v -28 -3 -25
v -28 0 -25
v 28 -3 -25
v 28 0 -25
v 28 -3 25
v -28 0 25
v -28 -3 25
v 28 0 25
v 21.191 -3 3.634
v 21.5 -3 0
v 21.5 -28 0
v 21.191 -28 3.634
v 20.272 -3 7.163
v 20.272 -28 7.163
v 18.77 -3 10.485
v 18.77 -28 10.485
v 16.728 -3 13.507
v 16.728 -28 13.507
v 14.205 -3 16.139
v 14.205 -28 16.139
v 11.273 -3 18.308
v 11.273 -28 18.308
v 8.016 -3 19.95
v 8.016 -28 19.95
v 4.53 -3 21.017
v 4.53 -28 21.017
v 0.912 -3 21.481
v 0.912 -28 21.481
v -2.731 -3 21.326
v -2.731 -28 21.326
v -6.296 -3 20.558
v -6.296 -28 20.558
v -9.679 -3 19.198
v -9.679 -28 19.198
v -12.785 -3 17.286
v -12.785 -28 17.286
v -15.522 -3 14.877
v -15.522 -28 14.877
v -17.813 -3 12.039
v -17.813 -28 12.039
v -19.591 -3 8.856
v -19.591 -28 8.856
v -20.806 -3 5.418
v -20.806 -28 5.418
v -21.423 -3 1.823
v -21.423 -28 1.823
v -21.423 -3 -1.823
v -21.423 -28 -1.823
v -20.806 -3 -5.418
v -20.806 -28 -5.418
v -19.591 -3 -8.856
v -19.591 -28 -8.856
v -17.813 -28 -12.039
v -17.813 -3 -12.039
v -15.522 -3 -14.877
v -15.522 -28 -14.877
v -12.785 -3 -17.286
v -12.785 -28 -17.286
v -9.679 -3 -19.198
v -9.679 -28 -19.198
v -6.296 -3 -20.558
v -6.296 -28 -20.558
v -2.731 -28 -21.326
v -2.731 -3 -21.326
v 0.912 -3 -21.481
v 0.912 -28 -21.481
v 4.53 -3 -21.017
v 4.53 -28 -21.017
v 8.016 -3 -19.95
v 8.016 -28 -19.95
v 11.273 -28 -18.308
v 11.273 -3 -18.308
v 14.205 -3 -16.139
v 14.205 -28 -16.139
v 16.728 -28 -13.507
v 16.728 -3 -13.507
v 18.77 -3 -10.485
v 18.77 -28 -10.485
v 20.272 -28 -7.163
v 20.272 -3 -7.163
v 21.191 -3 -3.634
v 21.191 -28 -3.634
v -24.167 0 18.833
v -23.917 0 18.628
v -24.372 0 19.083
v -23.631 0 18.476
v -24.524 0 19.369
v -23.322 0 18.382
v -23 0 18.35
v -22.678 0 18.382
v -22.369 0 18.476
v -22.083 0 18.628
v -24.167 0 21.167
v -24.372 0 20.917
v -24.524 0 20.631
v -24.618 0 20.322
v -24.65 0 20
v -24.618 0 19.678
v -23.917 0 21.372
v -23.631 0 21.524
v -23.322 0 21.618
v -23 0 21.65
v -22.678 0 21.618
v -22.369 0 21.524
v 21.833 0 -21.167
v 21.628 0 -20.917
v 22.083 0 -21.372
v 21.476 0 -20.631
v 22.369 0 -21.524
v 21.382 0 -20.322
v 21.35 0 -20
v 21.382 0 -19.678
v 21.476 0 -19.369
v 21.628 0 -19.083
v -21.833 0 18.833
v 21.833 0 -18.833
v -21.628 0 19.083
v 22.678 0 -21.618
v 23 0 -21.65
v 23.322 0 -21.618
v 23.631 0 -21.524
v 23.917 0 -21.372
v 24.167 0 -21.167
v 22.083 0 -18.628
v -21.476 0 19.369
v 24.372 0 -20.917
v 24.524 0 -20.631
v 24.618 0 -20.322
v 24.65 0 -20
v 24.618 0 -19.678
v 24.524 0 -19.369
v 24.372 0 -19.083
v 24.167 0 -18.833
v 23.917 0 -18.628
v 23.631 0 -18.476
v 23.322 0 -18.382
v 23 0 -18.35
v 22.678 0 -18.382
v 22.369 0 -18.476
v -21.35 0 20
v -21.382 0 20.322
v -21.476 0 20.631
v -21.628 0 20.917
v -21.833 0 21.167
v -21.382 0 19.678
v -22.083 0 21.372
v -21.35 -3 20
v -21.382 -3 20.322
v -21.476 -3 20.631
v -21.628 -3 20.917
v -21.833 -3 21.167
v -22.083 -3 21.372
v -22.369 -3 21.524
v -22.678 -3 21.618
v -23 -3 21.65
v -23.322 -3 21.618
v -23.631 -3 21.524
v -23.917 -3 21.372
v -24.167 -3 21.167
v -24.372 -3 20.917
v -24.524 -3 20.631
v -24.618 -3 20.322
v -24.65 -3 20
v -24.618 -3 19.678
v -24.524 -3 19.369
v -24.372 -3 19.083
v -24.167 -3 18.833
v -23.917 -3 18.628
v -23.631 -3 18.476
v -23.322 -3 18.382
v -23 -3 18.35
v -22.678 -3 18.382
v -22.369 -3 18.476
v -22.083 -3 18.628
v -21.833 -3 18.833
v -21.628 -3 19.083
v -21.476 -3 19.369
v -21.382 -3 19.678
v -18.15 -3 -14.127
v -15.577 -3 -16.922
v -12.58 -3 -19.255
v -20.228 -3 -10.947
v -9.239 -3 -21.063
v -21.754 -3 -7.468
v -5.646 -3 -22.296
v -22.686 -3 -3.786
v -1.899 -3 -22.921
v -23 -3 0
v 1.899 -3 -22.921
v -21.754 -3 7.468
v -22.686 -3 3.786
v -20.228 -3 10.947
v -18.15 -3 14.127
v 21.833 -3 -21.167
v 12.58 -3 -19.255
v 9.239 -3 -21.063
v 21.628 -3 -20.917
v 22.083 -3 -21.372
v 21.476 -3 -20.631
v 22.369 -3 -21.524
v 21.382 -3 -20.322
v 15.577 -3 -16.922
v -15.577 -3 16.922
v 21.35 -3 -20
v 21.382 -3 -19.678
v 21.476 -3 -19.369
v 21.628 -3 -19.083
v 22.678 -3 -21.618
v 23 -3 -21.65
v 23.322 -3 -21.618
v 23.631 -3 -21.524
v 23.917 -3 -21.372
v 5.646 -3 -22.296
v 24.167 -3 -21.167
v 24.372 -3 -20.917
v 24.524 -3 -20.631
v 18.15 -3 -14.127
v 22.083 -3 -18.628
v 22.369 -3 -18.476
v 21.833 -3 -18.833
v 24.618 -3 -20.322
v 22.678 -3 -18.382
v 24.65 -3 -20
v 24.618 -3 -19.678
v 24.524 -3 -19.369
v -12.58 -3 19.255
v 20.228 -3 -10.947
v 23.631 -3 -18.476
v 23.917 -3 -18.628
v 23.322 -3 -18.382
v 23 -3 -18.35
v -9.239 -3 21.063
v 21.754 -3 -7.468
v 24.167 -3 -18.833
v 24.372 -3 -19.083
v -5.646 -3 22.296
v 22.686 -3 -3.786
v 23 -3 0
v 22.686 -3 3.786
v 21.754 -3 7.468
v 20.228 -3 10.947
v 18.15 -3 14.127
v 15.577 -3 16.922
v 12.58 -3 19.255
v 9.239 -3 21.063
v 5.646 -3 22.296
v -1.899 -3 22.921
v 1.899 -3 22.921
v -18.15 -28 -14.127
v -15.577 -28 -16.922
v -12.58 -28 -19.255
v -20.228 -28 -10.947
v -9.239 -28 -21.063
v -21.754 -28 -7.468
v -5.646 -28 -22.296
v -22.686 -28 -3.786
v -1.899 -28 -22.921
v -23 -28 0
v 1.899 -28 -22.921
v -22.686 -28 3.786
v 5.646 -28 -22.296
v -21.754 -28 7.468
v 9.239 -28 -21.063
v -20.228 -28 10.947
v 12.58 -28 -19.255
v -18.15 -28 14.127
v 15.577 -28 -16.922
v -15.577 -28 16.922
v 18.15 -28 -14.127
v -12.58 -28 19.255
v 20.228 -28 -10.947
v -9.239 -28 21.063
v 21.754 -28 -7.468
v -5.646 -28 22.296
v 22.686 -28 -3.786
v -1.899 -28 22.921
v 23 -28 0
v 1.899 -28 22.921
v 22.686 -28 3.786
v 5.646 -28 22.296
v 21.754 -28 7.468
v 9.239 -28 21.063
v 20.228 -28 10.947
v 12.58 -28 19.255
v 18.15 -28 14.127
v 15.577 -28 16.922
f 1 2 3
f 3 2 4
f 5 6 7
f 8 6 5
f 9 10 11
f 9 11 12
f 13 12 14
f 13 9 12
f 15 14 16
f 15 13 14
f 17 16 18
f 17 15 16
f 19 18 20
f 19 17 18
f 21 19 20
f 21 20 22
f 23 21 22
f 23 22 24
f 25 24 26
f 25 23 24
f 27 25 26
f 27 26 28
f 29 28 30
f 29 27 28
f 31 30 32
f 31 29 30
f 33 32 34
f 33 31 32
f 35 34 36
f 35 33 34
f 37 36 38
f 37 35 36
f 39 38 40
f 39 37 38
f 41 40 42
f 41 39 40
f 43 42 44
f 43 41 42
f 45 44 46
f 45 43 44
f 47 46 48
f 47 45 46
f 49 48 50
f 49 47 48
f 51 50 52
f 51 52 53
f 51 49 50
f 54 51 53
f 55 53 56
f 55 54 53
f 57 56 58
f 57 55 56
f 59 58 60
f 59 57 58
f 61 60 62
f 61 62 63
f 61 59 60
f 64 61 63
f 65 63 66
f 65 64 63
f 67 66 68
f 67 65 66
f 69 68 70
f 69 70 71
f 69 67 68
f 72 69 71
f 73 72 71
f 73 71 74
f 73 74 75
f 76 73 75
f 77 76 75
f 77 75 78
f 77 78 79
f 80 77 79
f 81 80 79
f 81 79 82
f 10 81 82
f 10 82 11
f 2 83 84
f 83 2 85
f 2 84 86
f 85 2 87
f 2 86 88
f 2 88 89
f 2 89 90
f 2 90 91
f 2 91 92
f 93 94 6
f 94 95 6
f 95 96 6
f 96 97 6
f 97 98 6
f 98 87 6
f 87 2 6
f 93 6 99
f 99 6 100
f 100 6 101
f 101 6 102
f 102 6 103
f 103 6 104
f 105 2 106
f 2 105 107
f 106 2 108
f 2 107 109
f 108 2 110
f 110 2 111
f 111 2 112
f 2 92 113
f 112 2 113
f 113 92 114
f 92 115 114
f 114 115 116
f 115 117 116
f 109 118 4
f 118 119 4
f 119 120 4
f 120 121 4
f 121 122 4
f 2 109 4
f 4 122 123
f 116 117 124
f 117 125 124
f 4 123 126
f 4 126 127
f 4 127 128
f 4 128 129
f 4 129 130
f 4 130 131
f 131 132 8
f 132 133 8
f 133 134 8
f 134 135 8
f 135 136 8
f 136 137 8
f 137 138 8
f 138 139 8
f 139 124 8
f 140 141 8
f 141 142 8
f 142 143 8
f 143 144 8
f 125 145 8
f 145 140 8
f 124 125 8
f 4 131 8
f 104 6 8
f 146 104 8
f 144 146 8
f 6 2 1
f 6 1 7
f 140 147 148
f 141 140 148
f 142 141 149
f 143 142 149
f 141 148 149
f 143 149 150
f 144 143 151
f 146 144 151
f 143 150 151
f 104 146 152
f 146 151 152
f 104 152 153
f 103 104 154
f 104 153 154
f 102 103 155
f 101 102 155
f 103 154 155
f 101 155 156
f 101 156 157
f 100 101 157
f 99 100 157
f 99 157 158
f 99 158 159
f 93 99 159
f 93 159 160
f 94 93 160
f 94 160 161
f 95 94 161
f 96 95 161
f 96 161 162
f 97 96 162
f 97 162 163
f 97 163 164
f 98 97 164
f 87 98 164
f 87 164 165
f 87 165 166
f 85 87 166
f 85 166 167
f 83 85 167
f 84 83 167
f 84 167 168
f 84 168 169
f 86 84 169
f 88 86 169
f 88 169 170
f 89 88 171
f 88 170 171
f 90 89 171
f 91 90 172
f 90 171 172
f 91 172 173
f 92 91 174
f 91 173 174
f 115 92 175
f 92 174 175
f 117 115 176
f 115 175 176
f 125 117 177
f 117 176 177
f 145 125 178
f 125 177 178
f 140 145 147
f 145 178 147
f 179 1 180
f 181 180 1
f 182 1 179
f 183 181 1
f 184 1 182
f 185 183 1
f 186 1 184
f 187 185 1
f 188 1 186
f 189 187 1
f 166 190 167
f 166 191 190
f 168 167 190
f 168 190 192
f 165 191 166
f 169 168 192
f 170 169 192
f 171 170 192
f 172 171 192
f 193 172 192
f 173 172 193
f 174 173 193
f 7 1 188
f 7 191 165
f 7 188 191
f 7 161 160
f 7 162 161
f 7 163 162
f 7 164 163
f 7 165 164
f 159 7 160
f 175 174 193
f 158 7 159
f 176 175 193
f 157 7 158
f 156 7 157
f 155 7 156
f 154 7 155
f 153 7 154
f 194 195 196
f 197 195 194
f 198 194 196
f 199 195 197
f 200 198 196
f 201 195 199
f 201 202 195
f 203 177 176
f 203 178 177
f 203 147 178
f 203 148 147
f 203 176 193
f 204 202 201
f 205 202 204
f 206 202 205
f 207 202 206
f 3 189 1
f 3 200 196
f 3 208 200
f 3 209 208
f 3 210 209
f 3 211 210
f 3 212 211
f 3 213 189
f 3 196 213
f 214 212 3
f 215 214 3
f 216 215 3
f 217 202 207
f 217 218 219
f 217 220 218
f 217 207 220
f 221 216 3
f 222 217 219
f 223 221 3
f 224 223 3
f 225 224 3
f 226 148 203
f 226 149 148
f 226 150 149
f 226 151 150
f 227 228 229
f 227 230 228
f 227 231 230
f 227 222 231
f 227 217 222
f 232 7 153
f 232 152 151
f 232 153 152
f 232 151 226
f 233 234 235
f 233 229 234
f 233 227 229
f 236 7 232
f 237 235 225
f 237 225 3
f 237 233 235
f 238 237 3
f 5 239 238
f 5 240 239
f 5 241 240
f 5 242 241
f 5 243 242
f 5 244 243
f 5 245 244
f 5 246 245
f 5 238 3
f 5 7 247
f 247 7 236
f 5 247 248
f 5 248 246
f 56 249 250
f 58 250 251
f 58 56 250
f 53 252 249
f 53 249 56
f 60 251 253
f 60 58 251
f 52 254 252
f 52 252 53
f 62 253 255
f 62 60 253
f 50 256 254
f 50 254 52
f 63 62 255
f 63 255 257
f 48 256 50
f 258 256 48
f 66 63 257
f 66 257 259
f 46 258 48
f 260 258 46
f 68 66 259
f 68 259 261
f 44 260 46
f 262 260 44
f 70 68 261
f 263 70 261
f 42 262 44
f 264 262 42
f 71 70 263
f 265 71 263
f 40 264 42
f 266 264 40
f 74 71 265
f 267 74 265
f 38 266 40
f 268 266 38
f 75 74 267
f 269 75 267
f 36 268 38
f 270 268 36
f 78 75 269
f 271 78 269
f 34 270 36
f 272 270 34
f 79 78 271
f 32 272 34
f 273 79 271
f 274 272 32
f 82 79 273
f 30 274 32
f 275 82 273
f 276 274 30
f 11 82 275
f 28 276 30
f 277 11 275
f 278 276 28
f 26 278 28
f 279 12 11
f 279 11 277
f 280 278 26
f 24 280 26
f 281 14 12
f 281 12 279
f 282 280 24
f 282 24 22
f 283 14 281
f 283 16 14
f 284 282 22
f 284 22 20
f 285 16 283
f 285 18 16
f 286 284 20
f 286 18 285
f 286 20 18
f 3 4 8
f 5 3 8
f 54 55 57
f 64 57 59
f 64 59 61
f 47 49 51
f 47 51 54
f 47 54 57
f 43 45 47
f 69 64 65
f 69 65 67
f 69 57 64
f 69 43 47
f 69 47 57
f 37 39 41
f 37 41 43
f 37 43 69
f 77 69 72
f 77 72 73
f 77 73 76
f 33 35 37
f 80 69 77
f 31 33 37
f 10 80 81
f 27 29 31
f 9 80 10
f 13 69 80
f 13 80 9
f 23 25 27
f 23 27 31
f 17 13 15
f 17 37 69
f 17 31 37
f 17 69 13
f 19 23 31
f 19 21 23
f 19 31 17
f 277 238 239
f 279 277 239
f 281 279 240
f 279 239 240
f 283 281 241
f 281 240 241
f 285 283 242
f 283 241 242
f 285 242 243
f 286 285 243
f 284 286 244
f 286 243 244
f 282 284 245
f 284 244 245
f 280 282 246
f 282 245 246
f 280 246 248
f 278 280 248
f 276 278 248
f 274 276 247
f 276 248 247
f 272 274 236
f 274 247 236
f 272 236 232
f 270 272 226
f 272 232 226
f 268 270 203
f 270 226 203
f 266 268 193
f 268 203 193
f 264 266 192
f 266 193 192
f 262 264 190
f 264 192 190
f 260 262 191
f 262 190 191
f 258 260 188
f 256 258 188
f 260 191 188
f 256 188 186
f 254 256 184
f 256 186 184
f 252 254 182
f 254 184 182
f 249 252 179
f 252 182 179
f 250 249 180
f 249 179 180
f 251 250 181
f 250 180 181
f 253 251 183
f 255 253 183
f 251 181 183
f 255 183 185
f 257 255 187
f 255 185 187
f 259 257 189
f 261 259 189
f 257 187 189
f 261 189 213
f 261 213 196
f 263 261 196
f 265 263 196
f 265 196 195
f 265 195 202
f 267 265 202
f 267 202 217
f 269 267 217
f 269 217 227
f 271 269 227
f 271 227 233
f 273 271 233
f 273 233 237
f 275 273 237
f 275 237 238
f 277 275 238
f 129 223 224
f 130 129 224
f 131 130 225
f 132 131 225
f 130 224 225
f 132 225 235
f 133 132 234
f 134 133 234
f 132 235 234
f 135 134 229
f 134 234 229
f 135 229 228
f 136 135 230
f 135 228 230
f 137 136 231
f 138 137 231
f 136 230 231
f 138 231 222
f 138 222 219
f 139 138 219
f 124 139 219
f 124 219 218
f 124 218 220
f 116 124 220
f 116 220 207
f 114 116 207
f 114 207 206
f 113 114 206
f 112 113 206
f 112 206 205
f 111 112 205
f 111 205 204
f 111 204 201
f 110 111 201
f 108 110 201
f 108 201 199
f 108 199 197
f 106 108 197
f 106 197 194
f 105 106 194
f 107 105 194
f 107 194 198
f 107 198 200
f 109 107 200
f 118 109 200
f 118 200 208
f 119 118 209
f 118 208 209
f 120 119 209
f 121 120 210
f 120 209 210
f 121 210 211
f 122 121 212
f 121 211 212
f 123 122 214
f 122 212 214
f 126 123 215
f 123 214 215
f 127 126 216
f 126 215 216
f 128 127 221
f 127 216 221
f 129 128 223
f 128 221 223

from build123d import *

# Parameters (mm, degrees)
F0_W     = 56
F0_H     = 50
F0_R     = 1.65
F0_R_2   = 23
F0_R_3   = 21.5
F1_DEPTH = 28
F2_R     = 21.5
F3_DEPTH = 25
F4_R     = 1.65
F5_DEPTH = 28.001
F7_DEPTH = 25
F6_R     = 23
F6_R_2   = 21.5
F8_DEPTH = 25


with BuildPart() as f1:
    # F0 (on Front) → F1 (new body)
    with BuildSketch(Plane.XZ):
        Rectangle(F0_W, F0_H)
        with Locations((23, -20)):
            Circle(F0_R, mode=Mode.SUBTRACT)
        with Locations((-23, 20)):
            Circle(F0_R, mode=Mode.SUBTRACT)
        Circle(F0_R_2, mode=Mode.SUBTRACT)
        Circle(F0_R_2)
        Circle(F0_R_3, mode=Mode.SUBTRACT)
        Circle(F0_R_3)
        with Locations((23, -20)):
            Circle(F0_R)
        with Locations((-23, 20)):
            Circle(F0_R)
    extrude(amount=F1_DEPTH)

    # F2 (on face) → F3 (cut)
    with BuildSketch(Plane.XZ.offset(28)):
        Circle(F2_R)
    extrude(amount=-F3_DEPTH, mode=Mode.SUBTRACT)

    # F4 (on face) → F5 (cut, through all)
    with BuildSketch(Plane.XZ.offset(28)):
        with Locations((-23, 20)):
            Circle(F4_R)
        with Locations((23, -20)):
            Circle(F4_R)
    extrude(amount=-F5_DEPTH, mode=Mode.SUBTRACT)

    # F7 (cut): a face of the model
    f7_faces = [f1.faces().sort_by_distance(p)[0] for p in [
        (0, -28, -24.2492670248),
    ]]
    extrude(f7_faces, amount=-F7_DEPTH, mode=Mode.SUBTRACT)

    # F6 (on face) → F8 (join)
    with BuildSketch(Plane.XZ.offset(3)):
        Circle(F6_R)
        Circle(F6_R_2, mode=Mode.SUBTRACT)
    extrude(amount=F8_DEPTH)


solid = f1.part
